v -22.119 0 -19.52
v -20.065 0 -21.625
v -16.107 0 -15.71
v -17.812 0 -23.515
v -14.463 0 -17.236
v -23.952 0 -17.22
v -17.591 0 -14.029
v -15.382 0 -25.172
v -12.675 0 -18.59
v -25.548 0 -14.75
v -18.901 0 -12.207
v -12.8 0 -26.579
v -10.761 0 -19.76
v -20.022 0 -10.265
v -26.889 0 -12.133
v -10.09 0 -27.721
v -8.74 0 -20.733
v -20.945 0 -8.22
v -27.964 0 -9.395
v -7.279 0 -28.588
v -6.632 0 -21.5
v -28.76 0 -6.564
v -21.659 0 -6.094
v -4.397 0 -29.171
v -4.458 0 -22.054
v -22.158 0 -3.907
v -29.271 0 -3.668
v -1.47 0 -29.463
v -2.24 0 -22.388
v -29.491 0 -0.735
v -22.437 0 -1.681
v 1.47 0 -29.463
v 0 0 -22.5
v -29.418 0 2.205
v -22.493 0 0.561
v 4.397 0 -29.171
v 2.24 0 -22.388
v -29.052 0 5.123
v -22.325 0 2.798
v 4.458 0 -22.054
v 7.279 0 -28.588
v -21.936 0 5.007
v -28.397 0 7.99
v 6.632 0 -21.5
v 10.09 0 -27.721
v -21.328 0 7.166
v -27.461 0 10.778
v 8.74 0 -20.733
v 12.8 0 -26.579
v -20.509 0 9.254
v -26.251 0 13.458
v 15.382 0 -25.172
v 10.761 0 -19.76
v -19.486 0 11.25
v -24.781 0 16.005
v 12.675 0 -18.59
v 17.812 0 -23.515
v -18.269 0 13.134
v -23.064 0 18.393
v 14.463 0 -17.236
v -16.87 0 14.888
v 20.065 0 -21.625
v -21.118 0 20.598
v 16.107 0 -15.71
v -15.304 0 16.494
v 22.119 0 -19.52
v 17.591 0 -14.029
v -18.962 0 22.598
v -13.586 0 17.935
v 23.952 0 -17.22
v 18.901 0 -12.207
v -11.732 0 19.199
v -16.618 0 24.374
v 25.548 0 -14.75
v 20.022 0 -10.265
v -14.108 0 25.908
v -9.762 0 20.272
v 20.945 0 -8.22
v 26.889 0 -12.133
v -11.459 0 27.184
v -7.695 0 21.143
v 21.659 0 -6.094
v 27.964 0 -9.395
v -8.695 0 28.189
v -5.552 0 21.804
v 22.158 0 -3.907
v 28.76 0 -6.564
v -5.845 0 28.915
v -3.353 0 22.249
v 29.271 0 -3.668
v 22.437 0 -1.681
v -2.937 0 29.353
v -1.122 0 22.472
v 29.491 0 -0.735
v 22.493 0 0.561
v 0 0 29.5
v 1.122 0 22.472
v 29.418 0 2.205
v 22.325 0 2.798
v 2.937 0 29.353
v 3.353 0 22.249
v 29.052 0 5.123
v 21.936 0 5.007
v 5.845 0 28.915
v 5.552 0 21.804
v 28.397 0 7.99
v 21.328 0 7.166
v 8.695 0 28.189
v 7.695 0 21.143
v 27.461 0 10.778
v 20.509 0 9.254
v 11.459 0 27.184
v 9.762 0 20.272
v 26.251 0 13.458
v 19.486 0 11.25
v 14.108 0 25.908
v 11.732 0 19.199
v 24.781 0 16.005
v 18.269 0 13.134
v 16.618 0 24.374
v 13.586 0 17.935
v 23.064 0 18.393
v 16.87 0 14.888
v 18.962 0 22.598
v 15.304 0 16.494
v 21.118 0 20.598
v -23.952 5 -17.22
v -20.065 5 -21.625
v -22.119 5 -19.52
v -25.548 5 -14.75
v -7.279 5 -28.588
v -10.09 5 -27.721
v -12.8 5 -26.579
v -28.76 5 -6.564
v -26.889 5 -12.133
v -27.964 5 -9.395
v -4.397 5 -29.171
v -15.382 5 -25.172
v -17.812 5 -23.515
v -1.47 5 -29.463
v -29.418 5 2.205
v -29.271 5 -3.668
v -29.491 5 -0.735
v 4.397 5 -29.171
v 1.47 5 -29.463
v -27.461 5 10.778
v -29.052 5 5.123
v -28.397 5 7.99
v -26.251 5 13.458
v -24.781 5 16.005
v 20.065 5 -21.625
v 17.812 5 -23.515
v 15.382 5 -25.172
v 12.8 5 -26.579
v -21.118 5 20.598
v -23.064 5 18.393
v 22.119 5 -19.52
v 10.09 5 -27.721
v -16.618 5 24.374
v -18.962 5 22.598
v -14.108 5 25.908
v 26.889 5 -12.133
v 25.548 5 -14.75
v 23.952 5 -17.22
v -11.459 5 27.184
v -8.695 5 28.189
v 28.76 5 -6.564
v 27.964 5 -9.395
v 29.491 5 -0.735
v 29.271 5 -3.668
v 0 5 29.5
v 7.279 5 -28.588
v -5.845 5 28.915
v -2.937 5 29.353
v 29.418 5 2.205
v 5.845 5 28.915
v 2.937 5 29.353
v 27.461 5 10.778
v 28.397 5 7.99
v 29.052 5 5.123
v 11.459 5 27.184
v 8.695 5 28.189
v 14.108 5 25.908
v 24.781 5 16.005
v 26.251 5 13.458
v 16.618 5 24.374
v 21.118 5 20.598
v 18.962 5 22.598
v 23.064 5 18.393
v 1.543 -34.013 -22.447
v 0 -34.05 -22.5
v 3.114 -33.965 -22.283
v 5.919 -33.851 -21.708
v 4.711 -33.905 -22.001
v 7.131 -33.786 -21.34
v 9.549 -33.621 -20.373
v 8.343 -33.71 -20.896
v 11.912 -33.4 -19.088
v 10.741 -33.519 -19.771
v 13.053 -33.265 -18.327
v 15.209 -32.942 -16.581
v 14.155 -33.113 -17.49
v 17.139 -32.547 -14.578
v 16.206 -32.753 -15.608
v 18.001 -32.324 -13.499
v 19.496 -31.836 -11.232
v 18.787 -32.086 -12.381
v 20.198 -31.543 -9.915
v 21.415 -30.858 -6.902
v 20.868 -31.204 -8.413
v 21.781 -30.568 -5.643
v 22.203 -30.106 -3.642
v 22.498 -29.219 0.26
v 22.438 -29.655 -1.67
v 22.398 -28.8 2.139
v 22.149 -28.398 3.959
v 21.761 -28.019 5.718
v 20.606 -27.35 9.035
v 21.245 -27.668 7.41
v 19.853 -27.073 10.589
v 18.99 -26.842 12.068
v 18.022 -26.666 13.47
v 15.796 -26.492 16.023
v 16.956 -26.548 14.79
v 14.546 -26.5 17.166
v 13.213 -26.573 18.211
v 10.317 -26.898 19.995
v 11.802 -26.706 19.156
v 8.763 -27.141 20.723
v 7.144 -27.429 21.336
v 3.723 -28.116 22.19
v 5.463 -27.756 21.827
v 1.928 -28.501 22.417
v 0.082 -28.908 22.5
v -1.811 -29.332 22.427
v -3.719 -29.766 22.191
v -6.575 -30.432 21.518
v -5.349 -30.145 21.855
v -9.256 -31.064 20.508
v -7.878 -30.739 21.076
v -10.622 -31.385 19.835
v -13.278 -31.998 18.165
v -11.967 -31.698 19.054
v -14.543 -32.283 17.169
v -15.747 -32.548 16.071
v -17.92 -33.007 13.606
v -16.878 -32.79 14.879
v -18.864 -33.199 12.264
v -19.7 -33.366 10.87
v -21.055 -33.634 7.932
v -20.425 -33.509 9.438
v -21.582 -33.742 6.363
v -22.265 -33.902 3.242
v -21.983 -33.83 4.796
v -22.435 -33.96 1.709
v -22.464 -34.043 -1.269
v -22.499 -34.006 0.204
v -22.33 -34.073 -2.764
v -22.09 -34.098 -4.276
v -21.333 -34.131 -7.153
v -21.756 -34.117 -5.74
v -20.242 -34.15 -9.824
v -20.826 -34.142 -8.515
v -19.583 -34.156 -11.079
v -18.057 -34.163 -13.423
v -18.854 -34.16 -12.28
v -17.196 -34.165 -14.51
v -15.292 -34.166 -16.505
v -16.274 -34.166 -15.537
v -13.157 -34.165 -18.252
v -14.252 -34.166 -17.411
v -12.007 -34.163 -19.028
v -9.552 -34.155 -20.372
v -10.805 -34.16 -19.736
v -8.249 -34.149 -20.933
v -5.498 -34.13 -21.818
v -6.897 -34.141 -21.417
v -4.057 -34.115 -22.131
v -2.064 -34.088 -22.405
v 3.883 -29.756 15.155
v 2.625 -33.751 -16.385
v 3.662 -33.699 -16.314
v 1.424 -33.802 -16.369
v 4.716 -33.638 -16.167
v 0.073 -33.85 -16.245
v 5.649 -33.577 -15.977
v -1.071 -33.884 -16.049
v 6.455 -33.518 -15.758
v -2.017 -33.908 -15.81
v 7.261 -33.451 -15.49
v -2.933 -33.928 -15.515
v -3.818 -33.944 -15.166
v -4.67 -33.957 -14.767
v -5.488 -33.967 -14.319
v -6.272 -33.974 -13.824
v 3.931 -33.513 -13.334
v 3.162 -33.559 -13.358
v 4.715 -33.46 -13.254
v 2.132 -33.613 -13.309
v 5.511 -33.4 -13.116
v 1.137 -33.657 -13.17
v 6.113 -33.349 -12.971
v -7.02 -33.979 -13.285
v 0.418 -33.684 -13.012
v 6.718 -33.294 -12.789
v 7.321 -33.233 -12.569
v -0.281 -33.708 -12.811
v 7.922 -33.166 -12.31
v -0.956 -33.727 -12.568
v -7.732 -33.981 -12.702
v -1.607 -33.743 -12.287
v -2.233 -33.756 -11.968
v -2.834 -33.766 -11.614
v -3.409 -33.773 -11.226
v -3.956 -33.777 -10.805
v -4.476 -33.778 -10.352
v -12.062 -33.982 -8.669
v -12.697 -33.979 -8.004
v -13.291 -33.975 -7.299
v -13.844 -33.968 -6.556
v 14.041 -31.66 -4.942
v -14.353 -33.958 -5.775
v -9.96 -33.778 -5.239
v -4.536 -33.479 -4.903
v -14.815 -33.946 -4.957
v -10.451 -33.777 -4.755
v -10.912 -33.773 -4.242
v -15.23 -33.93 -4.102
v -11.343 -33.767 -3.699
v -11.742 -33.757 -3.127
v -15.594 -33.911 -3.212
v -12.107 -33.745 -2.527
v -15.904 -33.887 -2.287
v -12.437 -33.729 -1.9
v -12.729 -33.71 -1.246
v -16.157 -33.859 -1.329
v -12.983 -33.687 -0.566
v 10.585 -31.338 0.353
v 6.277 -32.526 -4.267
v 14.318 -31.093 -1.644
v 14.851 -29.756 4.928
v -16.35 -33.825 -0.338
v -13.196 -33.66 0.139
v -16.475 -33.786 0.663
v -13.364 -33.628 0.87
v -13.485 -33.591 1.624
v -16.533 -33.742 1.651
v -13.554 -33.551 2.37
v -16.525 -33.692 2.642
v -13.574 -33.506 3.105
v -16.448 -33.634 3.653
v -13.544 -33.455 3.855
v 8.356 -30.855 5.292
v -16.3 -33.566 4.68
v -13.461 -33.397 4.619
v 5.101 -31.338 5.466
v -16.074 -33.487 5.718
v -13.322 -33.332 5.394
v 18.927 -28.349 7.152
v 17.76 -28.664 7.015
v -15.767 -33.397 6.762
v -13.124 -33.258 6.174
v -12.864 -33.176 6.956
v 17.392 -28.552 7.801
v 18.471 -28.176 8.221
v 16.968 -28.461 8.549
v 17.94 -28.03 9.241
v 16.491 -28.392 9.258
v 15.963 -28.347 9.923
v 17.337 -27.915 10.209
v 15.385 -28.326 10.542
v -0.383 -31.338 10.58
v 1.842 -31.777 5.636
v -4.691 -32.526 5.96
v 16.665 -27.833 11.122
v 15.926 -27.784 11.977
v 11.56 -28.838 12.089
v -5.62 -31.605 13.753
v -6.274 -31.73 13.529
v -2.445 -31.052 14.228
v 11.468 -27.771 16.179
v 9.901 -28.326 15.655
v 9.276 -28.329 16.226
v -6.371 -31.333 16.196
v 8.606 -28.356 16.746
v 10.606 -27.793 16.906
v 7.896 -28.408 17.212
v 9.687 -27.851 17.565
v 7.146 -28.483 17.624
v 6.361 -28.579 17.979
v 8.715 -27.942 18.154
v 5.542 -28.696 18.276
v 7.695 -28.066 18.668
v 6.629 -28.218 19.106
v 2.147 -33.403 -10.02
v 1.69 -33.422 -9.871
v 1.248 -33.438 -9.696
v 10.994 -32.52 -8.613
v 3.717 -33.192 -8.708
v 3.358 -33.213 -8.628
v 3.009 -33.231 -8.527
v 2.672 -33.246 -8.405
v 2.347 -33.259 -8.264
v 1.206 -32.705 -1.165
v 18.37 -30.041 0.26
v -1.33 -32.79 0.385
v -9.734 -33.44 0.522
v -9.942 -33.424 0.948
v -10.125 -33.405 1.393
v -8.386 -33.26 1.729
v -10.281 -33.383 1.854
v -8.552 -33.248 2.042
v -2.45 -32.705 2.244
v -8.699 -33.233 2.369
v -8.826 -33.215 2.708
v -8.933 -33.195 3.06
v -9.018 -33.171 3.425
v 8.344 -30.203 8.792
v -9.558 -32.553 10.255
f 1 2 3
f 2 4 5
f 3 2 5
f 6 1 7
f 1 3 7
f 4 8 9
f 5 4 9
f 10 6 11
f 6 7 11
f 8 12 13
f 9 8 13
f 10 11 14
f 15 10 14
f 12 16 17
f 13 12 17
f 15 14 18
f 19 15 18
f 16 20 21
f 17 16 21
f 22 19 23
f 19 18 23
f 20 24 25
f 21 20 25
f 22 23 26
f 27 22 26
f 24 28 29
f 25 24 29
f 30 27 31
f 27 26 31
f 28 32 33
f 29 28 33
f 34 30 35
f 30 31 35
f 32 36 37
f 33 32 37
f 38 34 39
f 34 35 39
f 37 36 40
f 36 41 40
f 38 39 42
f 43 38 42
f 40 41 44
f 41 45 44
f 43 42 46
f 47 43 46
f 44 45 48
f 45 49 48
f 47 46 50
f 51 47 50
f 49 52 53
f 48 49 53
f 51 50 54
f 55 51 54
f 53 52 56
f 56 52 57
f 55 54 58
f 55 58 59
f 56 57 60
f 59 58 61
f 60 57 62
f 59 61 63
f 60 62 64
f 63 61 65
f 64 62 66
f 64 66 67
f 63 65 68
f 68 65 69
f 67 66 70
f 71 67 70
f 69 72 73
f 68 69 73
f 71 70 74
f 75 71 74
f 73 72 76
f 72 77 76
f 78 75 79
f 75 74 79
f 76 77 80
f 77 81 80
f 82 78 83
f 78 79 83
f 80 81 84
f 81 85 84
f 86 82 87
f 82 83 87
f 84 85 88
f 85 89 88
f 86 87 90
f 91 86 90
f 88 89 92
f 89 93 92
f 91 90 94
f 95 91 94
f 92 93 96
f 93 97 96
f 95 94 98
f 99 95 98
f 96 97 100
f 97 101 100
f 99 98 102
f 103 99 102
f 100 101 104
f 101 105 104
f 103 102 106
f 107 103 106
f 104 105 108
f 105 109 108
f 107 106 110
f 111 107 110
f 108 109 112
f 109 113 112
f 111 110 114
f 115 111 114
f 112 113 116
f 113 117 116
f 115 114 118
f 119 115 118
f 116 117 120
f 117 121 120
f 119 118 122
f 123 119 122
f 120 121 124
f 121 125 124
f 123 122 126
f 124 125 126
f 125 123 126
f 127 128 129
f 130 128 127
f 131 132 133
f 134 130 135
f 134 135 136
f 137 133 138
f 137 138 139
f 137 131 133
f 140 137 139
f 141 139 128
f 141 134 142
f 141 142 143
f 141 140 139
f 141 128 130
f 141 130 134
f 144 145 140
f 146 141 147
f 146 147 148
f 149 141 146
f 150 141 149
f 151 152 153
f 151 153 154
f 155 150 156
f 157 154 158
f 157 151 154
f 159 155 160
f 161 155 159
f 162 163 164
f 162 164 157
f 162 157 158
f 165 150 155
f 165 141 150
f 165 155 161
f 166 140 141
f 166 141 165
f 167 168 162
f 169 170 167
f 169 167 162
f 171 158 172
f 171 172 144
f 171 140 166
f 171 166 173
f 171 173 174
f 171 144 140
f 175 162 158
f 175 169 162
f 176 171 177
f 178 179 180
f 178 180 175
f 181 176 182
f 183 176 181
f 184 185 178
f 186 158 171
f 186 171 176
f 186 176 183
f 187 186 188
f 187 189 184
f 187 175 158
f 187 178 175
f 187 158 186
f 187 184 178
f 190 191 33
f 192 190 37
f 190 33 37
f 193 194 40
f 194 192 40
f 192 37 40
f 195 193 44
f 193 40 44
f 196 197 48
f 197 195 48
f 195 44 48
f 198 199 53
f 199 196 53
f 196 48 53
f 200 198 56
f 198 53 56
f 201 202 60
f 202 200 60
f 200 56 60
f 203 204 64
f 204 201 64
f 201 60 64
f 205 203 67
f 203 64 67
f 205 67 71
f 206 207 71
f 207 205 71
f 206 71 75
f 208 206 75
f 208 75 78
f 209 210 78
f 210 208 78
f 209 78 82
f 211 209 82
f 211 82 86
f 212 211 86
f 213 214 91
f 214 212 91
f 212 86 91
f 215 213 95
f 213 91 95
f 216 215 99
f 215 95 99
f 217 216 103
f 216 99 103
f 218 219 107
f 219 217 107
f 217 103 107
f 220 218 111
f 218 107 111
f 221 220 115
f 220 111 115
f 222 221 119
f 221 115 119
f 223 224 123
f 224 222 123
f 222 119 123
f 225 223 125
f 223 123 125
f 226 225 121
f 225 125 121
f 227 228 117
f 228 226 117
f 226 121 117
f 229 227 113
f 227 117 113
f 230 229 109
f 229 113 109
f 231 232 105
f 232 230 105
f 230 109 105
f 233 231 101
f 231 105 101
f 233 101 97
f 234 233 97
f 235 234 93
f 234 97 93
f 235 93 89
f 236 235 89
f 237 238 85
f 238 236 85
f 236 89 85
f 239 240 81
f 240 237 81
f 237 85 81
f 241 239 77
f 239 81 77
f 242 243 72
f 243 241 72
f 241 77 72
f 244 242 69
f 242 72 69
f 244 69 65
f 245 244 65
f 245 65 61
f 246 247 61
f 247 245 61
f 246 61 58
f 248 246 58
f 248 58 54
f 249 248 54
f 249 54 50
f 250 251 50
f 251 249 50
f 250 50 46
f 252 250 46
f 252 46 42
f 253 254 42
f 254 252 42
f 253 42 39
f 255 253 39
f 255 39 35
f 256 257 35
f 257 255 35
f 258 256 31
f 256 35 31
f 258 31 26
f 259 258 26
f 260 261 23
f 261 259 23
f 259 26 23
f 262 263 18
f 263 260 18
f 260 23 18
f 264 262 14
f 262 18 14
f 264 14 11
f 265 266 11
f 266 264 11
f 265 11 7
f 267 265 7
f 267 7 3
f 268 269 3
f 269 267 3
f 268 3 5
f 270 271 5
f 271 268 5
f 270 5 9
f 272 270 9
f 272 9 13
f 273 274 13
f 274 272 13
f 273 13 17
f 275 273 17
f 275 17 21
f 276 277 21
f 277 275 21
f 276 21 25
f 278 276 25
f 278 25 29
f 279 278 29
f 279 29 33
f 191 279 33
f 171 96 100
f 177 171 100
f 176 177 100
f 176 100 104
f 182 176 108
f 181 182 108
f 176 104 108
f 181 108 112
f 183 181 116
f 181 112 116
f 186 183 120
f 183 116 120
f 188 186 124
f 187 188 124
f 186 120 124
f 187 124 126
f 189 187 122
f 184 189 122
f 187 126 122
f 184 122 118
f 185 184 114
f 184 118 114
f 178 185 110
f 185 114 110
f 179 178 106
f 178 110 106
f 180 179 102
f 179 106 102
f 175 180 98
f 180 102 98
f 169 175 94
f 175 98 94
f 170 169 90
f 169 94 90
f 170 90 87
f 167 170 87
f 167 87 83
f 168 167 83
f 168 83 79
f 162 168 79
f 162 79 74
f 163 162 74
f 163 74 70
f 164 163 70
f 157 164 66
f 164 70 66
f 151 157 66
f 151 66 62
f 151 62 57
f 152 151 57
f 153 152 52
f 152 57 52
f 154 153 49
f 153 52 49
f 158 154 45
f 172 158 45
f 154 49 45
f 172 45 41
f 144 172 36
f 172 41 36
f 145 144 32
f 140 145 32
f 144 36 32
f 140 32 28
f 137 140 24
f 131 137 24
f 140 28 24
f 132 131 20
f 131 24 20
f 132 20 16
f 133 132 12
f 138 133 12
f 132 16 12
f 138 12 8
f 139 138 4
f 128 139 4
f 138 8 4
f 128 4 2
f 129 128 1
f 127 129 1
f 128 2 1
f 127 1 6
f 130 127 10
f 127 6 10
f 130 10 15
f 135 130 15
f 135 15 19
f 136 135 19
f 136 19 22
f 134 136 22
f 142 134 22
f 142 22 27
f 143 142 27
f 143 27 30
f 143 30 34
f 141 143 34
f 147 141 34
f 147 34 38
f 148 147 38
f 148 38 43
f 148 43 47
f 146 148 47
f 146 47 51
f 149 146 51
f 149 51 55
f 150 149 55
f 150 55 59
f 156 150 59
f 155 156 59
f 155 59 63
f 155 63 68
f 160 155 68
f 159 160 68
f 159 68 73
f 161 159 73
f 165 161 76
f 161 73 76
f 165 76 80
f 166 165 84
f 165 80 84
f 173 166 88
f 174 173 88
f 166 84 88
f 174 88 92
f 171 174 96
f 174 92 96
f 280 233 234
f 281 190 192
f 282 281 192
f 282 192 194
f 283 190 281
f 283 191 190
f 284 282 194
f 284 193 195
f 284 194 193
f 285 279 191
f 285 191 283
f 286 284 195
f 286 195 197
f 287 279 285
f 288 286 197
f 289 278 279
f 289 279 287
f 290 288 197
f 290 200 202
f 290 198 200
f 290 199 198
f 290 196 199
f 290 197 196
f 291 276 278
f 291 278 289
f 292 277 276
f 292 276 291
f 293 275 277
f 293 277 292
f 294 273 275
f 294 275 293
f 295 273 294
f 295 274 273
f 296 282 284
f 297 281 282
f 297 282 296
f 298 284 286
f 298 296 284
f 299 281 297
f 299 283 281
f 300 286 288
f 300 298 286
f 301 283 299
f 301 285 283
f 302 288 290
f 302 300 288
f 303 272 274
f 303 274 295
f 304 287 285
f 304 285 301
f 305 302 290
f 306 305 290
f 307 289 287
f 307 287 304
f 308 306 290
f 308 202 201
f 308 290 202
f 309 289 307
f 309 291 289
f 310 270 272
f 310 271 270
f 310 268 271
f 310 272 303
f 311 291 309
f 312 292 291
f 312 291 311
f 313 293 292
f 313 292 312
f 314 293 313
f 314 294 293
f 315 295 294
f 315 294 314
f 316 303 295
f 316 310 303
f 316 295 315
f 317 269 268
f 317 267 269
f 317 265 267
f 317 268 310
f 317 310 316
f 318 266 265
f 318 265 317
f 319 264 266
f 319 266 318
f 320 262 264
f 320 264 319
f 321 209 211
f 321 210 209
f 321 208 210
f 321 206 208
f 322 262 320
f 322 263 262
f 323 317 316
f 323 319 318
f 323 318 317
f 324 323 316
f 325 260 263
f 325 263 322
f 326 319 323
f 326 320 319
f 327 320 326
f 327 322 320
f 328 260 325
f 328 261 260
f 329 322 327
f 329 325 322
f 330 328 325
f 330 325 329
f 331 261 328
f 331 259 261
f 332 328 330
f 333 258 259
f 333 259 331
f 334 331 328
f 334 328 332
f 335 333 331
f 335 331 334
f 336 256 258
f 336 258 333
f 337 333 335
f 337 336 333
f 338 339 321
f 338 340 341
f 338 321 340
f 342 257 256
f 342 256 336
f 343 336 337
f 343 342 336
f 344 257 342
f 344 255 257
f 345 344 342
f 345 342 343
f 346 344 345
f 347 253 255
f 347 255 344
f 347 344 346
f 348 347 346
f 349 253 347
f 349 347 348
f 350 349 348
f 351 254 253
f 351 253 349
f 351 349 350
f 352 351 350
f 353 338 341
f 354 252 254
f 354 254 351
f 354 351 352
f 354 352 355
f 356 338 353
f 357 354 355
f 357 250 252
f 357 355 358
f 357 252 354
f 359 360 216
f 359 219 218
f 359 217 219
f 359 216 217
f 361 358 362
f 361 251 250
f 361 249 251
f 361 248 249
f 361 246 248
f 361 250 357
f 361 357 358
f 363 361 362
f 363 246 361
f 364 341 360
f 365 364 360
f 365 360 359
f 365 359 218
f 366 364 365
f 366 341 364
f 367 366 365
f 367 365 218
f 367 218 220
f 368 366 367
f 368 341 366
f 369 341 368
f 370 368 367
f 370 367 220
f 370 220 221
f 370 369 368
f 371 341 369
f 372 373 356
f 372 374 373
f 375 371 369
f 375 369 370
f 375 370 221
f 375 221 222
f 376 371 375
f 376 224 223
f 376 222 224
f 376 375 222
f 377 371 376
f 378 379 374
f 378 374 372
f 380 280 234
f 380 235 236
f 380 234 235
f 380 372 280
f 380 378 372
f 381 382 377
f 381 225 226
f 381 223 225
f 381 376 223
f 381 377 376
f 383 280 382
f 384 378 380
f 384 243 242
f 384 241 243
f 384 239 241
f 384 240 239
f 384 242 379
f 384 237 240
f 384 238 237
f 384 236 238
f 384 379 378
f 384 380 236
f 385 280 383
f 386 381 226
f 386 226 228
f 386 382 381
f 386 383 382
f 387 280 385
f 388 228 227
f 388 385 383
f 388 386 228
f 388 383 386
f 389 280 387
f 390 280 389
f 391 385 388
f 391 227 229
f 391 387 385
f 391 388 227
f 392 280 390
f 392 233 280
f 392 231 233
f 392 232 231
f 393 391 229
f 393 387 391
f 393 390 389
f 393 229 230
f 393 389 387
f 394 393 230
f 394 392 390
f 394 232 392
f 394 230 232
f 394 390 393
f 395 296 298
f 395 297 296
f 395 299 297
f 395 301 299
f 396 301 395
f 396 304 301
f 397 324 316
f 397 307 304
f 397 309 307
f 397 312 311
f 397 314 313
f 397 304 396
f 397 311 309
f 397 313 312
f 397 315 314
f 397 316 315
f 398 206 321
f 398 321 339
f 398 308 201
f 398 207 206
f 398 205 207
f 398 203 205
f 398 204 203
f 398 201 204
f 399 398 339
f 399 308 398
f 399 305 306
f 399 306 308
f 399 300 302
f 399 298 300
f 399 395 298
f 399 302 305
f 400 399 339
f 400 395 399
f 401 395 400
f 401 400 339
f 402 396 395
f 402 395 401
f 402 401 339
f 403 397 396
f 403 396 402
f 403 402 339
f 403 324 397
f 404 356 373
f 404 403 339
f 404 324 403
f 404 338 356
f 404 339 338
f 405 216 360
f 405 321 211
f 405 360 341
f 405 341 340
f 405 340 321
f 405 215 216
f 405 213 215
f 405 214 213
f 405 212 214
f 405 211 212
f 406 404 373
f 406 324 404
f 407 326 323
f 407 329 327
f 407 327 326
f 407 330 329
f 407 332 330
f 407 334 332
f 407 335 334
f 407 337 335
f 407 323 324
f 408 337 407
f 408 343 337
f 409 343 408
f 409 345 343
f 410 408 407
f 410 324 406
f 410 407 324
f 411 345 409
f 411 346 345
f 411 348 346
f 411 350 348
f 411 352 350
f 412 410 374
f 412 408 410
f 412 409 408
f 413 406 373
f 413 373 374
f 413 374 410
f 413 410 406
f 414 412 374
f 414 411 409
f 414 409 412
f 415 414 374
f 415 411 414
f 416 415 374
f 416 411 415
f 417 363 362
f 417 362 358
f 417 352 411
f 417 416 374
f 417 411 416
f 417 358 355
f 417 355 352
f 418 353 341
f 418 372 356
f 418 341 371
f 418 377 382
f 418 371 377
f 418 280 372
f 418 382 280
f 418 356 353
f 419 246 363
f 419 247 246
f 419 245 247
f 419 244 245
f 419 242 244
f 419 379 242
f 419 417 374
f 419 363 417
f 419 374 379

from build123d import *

# Parameters (mm, degrees)
SKETCH2_R           = 29.5
BOSS_EXTRUDE1_DEPTH = 5
SKETCH3_R           = 22.5
BOSS_EXTRUDE2_DEPTH = 100
CUT_EXTRUDE1_DEPTH  = 181


with BuildPart() as part:
    # Sketch2 → Boss-Extrude1 (new body)
    with BuildSketch(Plane(origin=(0, 0, 0), x_dir=(1, 0, 0), z_dir=(0, 1, 0))):
        with Locations(Location((0, 0, 0), (0, 0, 270))):
            Circle(SKETCH2_R)
    extrude(amount=BOSS_EXTRUDE1_DEPTH)

    # Sketch3 → Boss-Extrude2 (add)
    with BuildSketch(Plane.XZ):
        with Locations(Location((0, 0, 0), (0, 0, 270))):
            Circle(SKETCH3_R)
    extrude(amount=BOSS_EXTRUDE2_DEPTH)

    # Sketch4 → Cut-Extrude1 (cut)
    with BuildSketch(Plane(origin=(-63.996216882, 0, 59.671888061), x_dir=(0.6819644349807488, 0, 0.7313853357987076), z_dir=(-0.7313853357987076, 0, 0.6819644349807488))):
        with BuildLine():
            Line((-29.125423753, -34.169486826), (-29.125423753, -106.993301149))
            Line((-29.125423753, -106.993301149), (28.333748465, -106.993301149))
            Line((28.333748465, -106.993301149), (28.333748465, -22.496404242))
            add(Edge.make_bspline(
                [(-29.125423753, -34.169486826), (-19.027495219, -34.227173533), (-4.480834303, -34.028222863), (14.926714819, -29.772095296), (24.25688535, -26.283529721), (28.333748465, -22.496404242)],
                knots=[0, 0, 0, 0, 0.508723689, 0.724602868, 1, 1, 1, 1], degree=3))
        make_face()
    extrude(amount=-CUT_EXTRUDE1_DEPTH, mode=Mode.SUBTRACT)


solid = part.part
